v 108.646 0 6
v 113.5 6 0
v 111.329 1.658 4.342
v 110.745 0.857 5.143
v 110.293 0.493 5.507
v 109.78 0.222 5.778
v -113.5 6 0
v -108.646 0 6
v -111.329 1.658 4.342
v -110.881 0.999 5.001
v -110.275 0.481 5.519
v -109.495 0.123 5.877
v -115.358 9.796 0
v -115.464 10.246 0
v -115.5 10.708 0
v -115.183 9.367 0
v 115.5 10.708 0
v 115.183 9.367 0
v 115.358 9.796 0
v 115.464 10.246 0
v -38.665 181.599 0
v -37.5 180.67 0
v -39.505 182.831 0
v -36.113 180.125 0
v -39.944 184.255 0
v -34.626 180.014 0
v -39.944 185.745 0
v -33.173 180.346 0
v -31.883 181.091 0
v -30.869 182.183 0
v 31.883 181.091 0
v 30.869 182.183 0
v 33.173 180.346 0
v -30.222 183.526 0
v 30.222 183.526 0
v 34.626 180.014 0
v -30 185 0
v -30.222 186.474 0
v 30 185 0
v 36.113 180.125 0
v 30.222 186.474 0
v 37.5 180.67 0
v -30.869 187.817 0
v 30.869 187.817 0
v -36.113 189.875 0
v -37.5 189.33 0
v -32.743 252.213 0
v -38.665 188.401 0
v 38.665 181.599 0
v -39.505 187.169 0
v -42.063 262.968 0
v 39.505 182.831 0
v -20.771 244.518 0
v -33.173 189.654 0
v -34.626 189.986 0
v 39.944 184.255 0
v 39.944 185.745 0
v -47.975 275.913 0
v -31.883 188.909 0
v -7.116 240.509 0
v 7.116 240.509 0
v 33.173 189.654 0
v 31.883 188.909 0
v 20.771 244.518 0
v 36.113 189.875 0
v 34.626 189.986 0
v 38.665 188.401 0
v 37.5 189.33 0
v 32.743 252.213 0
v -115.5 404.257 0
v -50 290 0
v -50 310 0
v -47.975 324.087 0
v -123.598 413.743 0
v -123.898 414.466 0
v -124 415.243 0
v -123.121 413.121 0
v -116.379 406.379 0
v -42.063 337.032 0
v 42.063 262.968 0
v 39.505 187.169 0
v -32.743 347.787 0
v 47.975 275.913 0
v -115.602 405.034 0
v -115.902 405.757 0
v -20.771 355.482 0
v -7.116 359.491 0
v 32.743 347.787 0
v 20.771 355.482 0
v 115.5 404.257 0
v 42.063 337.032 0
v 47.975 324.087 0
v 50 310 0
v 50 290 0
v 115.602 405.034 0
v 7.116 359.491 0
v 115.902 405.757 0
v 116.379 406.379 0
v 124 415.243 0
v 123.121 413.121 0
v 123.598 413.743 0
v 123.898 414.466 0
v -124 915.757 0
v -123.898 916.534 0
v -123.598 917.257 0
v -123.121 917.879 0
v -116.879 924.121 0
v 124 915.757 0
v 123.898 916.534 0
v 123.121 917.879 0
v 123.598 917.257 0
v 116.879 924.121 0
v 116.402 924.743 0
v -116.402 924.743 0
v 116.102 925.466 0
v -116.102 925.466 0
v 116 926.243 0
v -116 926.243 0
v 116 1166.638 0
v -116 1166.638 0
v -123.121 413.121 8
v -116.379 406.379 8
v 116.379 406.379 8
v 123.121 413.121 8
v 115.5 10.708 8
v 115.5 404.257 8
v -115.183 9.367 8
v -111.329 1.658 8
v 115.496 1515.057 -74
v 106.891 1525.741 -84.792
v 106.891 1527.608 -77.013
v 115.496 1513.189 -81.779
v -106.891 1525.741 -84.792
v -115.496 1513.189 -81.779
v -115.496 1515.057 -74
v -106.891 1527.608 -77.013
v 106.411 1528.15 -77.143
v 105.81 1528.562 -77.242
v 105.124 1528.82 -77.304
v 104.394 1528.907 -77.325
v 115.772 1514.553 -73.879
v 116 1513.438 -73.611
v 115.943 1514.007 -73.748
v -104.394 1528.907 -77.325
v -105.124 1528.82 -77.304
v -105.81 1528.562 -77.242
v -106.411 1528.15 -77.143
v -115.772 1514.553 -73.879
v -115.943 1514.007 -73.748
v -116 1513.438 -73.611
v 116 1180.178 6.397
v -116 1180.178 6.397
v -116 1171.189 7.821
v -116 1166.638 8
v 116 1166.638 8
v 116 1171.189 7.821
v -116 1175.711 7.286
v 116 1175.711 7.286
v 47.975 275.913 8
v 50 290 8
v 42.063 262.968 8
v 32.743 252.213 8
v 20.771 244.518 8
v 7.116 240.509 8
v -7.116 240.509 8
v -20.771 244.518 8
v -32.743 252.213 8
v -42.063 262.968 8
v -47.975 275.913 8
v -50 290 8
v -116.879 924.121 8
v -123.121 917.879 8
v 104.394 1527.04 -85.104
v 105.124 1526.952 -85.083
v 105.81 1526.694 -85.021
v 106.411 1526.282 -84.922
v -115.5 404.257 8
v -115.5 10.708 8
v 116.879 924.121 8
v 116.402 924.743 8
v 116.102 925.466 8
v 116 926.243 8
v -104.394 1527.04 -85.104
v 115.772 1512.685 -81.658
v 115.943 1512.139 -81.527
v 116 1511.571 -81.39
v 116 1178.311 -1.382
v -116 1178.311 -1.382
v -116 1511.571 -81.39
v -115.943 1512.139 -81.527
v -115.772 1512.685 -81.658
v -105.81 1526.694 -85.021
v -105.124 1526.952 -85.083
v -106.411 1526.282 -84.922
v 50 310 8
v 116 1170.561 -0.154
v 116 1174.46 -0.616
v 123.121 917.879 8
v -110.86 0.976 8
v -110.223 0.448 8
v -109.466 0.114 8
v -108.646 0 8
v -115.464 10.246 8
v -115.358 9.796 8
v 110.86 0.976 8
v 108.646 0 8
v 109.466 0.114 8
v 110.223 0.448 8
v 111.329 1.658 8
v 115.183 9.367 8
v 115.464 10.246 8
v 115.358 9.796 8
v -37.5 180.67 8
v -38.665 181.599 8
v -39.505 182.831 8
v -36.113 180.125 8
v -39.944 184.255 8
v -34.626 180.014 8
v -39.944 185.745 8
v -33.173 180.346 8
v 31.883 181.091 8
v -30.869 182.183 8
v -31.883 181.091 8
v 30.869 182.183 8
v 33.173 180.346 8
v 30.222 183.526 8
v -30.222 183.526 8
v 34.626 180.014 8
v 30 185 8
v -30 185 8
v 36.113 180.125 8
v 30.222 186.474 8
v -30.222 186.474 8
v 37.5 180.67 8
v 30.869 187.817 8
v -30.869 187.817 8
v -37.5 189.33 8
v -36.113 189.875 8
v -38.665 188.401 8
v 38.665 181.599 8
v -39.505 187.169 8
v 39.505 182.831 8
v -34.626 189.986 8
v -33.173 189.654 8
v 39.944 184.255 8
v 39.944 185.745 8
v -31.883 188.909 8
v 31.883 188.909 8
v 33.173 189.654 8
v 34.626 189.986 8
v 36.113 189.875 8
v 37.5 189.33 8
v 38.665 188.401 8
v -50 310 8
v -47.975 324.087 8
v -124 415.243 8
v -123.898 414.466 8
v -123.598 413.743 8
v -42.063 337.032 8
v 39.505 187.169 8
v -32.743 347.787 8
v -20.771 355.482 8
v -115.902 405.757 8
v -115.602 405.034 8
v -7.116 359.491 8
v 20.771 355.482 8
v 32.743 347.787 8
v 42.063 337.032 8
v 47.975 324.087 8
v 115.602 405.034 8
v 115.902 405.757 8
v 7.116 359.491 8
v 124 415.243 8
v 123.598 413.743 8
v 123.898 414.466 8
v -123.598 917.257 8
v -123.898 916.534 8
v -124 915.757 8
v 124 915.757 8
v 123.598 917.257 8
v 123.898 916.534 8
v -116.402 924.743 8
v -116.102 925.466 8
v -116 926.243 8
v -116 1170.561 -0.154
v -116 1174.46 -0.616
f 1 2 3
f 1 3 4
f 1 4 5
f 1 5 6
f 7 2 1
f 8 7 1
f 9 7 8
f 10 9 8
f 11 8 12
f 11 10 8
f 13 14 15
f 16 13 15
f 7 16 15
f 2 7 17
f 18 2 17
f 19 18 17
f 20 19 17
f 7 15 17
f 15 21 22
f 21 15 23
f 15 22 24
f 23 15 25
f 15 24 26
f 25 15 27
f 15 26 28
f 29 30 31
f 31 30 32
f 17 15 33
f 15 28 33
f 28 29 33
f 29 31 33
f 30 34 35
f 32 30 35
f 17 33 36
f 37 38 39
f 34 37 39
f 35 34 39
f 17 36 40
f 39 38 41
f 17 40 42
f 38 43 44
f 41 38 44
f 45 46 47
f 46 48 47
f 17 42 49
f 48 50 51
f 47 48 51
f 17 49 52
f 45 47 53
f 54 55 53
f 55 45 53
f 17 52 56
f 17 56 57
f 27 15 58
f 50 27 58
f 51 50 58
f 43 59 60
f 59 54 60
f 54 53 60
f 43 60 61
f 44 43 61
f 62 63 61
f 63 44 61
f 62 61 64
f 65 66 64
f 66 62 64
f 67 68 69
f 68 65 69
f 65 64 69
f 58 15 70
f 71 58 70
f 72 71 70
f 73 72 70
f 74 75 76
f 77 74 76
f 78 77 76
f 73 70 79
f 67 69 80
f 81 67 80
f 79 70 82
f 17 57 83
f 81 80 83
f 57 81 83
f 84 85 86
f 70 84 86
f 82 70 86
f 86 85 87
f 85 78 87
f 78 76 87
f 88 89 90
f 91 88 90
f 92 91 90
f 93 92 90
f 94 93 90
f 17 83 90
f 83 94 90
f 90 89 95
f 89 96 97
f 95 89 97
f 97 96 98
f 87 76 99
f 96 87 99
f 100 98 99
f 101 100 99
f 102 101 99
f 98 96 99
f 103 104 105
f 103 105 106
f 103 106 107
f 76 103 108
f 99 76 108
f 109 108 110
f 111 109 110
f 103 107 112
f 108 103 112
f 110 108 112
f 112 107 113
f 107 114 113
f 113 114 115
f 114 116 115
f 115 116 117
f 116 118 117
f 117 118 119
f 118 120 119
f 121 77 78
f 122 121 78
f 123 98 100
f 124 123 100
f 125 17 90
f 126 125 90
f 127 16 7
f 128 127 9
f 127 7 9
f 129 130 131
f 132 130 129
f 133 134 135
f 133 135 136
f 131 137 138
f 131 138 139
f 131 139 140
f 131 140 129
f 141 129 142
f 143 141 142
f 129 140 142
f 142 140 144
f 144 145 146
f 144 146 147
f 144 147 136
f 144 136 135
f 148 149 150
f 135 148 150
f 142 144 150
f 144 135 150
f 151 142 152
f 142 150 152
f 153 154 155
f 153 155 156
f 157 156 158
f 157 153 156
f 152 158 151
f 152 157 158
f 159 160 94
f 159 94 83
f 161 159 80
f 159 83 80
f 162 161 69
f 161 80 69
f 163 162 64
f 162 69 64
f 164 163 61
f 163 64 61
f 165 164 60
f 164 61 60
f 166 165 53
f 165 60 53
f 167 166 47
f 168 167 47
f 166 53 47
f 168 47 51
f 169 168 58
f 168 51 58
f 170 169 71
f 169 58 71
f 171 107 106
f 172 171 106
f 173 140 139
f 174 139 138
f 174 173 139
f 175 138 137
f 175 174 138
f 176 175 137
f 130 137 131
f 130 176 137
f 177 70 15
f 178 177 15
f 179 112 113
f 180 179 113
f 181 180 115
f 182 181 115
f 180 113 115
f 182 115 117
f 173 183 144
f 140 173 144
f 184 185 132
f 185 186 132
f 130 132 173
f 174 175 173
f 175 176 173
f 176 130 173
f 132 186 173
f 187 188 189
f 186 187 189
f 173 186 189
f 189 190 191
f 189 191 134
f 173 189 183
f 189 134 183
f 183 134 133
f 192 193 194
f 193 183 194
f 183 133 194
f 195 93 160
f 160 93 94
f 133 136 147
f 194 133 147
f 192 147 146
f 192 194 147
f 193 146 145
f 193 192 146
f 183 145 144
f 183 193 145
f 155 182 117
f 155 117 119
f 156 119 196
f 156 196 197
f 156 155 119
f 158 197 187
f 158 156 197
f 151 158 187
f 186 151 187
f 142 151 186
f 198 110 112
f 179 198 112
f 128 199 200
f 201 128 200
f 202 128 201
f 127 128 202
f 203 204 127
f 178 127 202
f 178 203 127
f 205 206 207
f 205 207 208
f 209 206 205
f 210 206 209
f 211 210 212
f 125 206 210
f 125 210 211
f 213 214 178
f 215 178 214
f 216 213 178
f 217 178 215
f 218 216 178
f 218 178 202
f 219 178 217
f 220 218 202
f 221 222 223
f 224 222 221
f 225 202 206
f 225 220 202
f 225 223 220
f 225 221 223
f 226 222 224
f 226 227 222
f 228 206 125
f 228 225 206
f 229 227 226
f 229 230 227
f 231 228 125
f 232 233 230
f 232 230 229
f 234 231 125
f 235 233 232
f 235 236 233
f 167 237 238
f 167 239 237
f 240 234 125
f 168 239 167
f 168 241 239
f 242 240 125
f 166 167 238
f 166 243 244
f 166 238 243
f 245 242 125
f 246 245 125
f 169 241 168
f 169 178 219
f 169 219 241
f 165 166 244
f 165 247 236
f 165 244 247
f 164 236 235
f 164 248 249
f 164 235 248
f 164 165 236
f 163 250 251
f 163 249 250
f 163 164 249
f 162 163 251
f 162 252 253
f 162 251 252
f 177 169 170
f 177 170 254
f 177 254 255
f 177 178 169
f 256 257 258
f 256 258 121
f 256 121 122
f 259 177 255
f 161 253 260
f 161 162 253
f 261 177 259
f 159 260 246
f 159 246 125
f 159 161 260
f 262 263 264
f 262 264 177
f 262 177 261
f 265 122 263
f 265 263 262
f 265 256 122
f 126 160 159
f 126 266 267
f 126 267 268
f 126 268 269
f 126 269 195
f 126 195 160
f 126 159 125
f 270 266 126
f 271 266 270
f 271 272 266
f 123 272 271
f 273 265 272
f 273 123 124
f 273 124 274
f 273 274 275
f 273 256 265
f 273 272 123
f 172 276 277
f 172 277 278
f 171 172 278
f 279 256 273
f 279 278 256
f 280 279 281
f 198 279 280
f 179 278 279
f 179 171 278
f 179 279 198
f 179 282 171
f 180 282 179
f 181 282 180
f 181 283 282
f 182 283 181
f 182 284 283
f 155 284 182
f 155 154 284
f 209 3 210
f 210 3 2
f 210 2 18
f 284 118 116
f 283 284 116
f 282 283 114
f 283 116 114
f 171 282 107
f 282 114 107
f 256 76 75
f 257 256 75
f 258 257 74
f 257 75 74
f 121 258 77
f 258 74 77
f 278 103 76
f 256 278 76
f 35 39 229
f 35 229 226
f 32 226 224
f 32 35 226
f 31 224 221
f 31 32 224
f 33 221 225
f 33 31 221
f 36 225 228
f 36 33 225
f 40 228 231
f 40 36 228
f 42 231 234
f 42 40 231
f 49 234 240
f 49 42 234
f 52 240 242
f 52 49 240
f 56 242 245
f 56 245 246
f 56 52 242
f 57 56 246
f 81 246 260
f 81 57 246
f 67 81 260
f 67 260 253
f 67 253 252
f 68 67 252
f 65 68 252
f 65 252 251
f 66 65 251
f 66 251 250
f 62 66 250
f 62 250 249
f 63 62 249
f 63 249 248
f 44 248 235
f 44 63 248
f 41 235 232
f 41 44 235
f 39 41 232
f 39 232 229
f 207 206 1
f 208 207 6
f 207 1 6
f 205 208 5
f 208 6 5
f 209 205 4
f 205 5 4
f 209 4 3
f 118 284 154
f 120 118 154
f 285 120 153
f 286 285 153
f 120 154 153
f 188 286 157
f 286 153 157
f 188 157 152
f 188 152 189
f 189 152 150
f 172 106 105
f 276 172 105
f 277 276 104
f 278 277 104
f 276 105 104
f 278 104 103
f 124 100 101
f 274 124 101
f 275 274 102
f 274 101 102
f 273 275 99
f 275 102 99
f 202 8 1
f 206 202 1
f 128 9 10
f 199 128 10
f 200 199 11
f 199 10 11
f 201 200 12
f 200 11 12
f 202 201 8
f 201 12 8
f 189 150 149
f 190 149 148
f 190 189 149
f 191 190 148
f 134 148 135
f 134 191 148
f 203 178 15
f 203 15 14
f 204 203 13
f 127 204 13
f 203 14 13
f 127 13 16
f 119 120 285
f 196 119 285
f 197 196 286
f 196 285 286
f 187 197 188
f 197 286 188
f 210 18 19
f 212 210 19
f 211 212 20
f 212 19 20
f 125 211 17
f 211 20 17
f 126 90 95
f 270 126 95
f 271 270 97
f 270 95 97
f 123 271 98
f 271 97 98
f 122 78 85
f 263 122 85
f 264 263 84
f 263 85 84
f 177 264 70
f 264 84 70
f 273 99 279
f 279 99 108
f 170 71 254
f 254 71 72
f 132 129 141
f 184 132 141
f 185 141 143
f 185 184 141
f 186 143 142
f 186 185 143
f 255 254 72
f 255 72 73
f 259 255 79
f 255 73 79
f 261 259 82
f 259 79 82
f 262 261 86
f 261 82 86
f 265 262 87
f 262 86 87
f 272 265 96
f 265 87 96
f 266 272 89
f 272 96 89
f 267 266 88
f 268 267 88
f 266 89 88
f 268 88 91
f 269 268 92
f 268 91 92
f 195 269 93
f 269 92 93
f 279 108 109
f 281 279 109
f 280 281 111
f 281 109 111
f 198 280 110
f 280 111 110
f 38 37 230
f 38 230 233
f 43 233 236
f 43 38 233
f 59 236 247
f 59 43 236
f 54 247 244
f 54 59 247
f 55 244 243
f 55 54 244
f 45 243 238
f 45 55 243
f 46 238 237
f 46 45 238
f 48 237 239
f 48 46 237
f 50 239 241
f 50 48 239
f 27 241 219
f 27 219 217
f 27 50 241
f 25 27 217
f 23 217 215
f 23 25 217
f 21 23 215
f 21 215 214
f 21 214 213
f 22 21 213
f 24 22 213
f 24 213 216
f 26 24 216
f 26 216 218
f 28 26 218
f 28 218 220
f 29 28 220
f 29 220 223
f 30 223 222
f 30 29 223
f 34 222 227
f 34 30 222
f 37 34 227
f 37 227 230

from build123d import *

# Parameters (mm, degrees)
SKETCH1_R              = 5
EXTRUDE1_DEPTH         = 8
PROCESS_BENDS1_START   = -116
PROCESS_BENDS1_DEPTH   = 232
PROCESS_BENDS1_2_DEPTH = 232
PROCESS_BENDS1_START_2 = 273
PROCESS_BENDS1_3_DEPTH = 10
SK_RPNING1_SIZE        = 6


with BuildPart() as part:
    # Sketch1 → Extrude1 (new body)
    with BuildSketch(Plane.XY):
        with BuildLine():
            Line((-108.645898034, 0), (108.645898034, 0))
            ThreePointArc((108.645898034, 0), (110.22309137, 0.448047575), (111.329179607, 1.658359214))
            Line((111.329179607, 1.658359214), (115.183281573, 9.366563146))
            ThreePointArc((115.183281573, 9.366563146), (115.419746968, 10.018945171), (115.5, 10.708203932))
            Line((115.5, 10.708203932), (115.5, 404.257359313))
            ThreePointArc((115.5, 404.257359313), (115.728361402, 405.40540961), (116.378679656, 406.378679656))
            Line((116.378679656, 406.378679656), (123.121320344, 413.121320344))
            ThreePointArc((123.121320344, 413.121320344), (123.771638598, 414.09459039), (124, 415.242640687))
            Line((124, 415.242640687), (124, 915.757359313))
            ThreePointArc((124, 915.757359313), (123.771638598, 916.90540961), (123.121320344, 917.878679656))
            Line((123.121320344, 917.878679656), (116.878679656, 924.121320344))
            ThreePointArc((116.878679656, 924.121320344), (116.228361402, 925.09459039), (116, 926.242640687))
            Line((116, 926.242640687), (116, 1522.091673087))
            ThreePointArc((116, 1522.091673087), (115.871276079, 1522.961025533), (115.496150883, 1523.755773675))
            Line((115.496150883, 1523.755773675), (106.890599608, 1536.664100589))
            ThreePointArc((106.890599608, 1536.664100589), (105.810022501, 1537.645023796), (104.394448725, 1538))
            Line((104.394448725, 1538), (-104.394448725, 1538))
            ThreePointArc((-104.394448725, 1538), (-105.810022501, 1537.645023796), (-106.890599608, 1536.664100589))
            Line((-106.890599608, 1536.664100589), (-115.496150883, 1523.755773675))
            ThreePointArc((-115.496150883, 1523.755773675), (-115.871276079, 1522.961025533), (-116, 1522.091673087))
            Line((-116, 1522.091673087), (-116, 926.242640687))
            ThreePointArc((-116, 926.242640687), (-116.228361402, 925.09459039), (-116.878679656, 924.121320344))
            Line((-116.878679656, 924.121320344), (-123.121320344, 917.878679656))
            ThreePointArc((-123.121320344, 917.878679656), (-123.771638598, 916.90540961), (-124, 915.757359313))
            Line((-124, 915.757359313), (-124, 415.242640687))
            ThreePointArc((-124, 415.242640687), (-123.771638598, 414.09459039), (-123.121320344, 413.121320344))
            Line((-123.121320344, 413.121320344), (-116.378679656, 406.378679656))
            ThreePointArc((-116.378679656, 406.378679656), (-115.728361402, 405.40540961), (-115.5, 404.257359313))
            Line((-115.5, 404.257359313), (-115.5, 10.708203932))
            ThreePointArc((-115.5, 10.708203932), (-115.419746968, 10.018945171), (-115.183281573, 9.366563146))
            Line((-115.183281573, 9.366563146), (-111.329179607, 1.658359214))
            ThreePointArc((-111.329179607, 1.658359214), (-110.22309137, 0.448047575), (-108.645898034, 0))
        make_face()
        with Locations((-35, 185)):
            Circle(SKETCH1_R, mode=Mode.SUBTRACT)
        with Locations(Location((35, 185, 0), (0, 0, 180))):
            Circle(SKETCH1_R, mode=Mode.SUBTRACT)
        with BuildLine():
            Line((-50, 290), (-50, 310))
            ThreePointArc((-50, 310), (0, 360), (50, 310))
            Line((50, 310), (50, 290))
            ThreePointArc((50, 290), (0, 240), (-50, 290))
        make_face(mode=Mode.SUBTRACT)
    extrude(amount=EXTRUDE1_DEPTH)

    # Process-Bends1: read off the stored shape, not the designer's step
    # Process-Bends1 outline → Process-Bends1 (cut)
    with BuildSketch(Plane.YZ.offset(PROCESS_BENDS1_START)):
        with BuildLine():
            Line((1180.17810598, 6.397455383), (1206.825425416, 0))
            Line((1206.825425416, 0), (1538, 0))
            Line((1538, 0), (1538, 8))
            Line((1538, 8), (1166.638274876, 8))
            ThreePointArc((1166.638274876, 8), (1173.455443929, 7.597970503), (1180.17810598, 6.397455383))
        make_face()
    extrude(amount=PROCESS_BENDS1_DEPTH, mode=Mode.SUBTRACT)

    # Process-Bends1 2 outline → Process-Bends1 2 (add)
    with BuildSketch(Plane.YZ.offset(PROCESS_BENDS1_START)):
        with BuildLine():
            Line((1527.039613862, -85.103946551), (1528.907176773, -77.324987188))
            Line((1528.907176773, -77.324987188), (1206.825425416, 0))
            Line((1206.825425416, 0), (1166.638274876, 0))
            ThreePointArc((1166.638274876, 0), (1172.515144749, -0.346577152), (1178.310543069, -1.38150398))
            Line((1178.310543069, -1.38150398), (1527.039613862, -85.103946551))
        make_face()
    extrude(amount=PROCESS_BENDS1_2_DEPTH)

    # Process-Bends1 3 outline → Process-Bends1 3 (cut)
    with BuildSketch(Plane(origin=(0, 0, 0), x_dir=(1, 0, 0), z_dir=(0, 0.2334453638559061, 0.9723699203976764)).offset(PROCESS_BENDS1_START_2)):
        with BuildLine():
            ThreePointArc((-116, 1488.806182631), (-115.871276079, 1489.675535077), (-115.496150883, 1490.470283219))
            Line((-115.496150883, 1490.470283219), (-106.890599608, 1503.378610132))
            ThreePointArc((-106.890599608, 1503.378610132), (-105.810022502, 1504.35953334), (-104.394448725, 1504.714509544))
            Line((-104.394448725, 1504.714509544), (-116, 1504.714509543))
            Line((-116, 1504.714509543), (-116, 1488.806182631))
        make_face()
        with BuildLine():
            Line((116, 1504.714509543), (104.394448725, 1504.714509544))
            ThreePointArc((104.394448725, 1504.714509544), (105.810022502, 1504.35953334), (106.890599608, 1503.378610132))
            Line((106.890599608, 1503.378610132), (115.496150883, 1490.470283219))
            ThreePointArc((115.496150883, 1490.470283219), (115.871276079, 1489.675535077), (116, 1488.806182631))
            Line((116, 1488.806182631), (116, 1504.714509543))
        make_face()
    extrude(amount=PROCESS_BENDS1_3_DEPTH, mode=Mode.SUBTRACT)

    # Skærpning1
    # the kernel refuses this chamfer: 6 mm, written as the material it takes off along each edge
    with BuildSketch(Plane(origin=(-124.075995962, 0, 0), x_dir=(0, 1, 0), z_dir=(1, 0, 0))) as sk_rpning1_piece_1:
        Polygon((SK_RPNING1_SIZE, 0), (0, SK_RPNING1_SIZE), (0, 0), align=None)
    extrude(amount=248.151991923, mode=Mode.SUBTRACT)
    with BuildSketch(Plane(origin=(-108.645898034, 3, 0), x_dir=(0.03163904554191759, -0.9994993600784327, 0), z_dir=(-0.9994993600784327, -0.03163904554191759, 0))) as sk_rpning1_piece_2_section:
        Polygon((0, 3), (3, SK_RPNING1_SIZE), (3, 0), (0, 0), align=None)
    sk_rpning1_piece_2 = revolve(axis=Axis((-108.645898034, 3, 0), (0, 0, 1)), revolution_arc=358.186913645, mode=Mode.PRIVATE)
    sk_rpning1_piece_2 = split(sk_rpning1_piece_2, bisect_by=Plane(origin=(-108.645898034, 4.5, 1.5), z_dir=(0, -0.7071067811865483, -0.7071067811865468)), keep=Keep.TOP, mode=Mode.PRIVATE)
    add(sk_rpning1_piece_2, mode=Mode.SUBTRACT)
    with BuildSketch(Plane(origin=(108.645898034, 3, 0), x_dir=(0, -1, 0), z_dir=(-1, 0, 0))) as sk_rpning1_piece_3_section:
        Polygon((0, 3), (3, SK_RPNING1_SIZE), (3, 0), (0, 0), align=None)
    sk_rpning1_piece_3 = revolve(axis=Axis((108.645898034, 3, 0), (0, 0, 1)), revolution_arc=358.186913645, mode=Mode.PRIVATE)
    sk_rpning1_piece_3 = split(sk_rpning1_piece_3, bisect_by=Plane(origin=(108.645898034, 4.5, 1.5), z_dir=(0, -0.7071067811865483, -0.7071067811865468)), keep=Keep.TOP, mode=Mode.PRIVATE)
    add(sk_rpning1_piece_3, mode=Mode.SUBTRACT)


solid = part.part
